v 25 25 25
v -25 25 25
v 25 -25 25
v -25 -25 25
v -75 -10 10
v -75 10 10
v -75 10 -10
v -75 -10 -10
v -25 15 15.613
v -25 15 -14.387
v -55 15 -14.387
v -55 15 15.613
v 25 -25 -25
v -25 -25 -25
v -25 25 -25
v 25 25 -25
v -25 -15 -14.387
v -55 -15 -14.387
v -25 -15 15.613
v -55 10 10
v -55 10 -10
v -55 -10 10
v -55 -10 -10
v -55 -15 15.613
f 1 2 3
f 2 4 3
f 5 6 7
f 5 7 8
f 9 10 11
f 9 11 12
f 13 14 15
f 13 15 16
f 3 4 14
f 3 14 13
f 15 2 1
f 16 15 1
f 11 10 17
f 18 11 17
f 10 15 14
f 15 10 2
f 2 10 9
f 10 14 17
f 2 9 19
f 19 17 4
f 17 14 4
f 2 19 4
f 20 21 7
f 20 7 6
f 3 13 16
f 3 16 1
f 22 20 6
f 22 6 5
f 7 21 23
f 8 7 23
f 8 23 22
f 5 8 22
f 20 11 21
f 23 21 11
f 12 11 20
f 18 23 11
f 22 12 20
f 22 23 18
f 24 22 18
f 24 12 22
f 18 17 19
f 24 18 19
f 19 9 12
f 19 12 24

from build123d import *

# Parameters (mm, degrees)
F0_W     = 50
F0_H     = 50
F1_DEPTH = 25
F2_W     = 30
F2_H     = 30
F3_DEPTH = 30
F4_W     = 20
F4_H     = 20
F5_DEPTH = 20


with BuildPart() as f1:
    # F0 (on Front) → F1 (new body, symmetric)
    with BuildSketch(Plane.XZ):
        Rectangle(F0_W, F0_H)
    extrude(amount=F1_DEPTH, both=True)

    # F2 (on face) → F3 (join)
    with BuildSketch(Plane(origin=(-25, 0, 0), x_dir=(0, -1, 0), z_dir=(-1, 0, 0))):
        with Locations((0, 0.612991)):
            Rectangle(F2_W, F2_H)
    extrude(amount=F3_DEPTH)

    # F4 (on face) → F5 (join)
    with BuildSketch(Plane(origin=(-55, 0, 0), x_dir=(0, -1, 0), z_dir=(-1, 0, 0))):
        Rectangle(F4_W, F4_H)
    extrude(amount=F5_DEPTH)


solid = f1.part
